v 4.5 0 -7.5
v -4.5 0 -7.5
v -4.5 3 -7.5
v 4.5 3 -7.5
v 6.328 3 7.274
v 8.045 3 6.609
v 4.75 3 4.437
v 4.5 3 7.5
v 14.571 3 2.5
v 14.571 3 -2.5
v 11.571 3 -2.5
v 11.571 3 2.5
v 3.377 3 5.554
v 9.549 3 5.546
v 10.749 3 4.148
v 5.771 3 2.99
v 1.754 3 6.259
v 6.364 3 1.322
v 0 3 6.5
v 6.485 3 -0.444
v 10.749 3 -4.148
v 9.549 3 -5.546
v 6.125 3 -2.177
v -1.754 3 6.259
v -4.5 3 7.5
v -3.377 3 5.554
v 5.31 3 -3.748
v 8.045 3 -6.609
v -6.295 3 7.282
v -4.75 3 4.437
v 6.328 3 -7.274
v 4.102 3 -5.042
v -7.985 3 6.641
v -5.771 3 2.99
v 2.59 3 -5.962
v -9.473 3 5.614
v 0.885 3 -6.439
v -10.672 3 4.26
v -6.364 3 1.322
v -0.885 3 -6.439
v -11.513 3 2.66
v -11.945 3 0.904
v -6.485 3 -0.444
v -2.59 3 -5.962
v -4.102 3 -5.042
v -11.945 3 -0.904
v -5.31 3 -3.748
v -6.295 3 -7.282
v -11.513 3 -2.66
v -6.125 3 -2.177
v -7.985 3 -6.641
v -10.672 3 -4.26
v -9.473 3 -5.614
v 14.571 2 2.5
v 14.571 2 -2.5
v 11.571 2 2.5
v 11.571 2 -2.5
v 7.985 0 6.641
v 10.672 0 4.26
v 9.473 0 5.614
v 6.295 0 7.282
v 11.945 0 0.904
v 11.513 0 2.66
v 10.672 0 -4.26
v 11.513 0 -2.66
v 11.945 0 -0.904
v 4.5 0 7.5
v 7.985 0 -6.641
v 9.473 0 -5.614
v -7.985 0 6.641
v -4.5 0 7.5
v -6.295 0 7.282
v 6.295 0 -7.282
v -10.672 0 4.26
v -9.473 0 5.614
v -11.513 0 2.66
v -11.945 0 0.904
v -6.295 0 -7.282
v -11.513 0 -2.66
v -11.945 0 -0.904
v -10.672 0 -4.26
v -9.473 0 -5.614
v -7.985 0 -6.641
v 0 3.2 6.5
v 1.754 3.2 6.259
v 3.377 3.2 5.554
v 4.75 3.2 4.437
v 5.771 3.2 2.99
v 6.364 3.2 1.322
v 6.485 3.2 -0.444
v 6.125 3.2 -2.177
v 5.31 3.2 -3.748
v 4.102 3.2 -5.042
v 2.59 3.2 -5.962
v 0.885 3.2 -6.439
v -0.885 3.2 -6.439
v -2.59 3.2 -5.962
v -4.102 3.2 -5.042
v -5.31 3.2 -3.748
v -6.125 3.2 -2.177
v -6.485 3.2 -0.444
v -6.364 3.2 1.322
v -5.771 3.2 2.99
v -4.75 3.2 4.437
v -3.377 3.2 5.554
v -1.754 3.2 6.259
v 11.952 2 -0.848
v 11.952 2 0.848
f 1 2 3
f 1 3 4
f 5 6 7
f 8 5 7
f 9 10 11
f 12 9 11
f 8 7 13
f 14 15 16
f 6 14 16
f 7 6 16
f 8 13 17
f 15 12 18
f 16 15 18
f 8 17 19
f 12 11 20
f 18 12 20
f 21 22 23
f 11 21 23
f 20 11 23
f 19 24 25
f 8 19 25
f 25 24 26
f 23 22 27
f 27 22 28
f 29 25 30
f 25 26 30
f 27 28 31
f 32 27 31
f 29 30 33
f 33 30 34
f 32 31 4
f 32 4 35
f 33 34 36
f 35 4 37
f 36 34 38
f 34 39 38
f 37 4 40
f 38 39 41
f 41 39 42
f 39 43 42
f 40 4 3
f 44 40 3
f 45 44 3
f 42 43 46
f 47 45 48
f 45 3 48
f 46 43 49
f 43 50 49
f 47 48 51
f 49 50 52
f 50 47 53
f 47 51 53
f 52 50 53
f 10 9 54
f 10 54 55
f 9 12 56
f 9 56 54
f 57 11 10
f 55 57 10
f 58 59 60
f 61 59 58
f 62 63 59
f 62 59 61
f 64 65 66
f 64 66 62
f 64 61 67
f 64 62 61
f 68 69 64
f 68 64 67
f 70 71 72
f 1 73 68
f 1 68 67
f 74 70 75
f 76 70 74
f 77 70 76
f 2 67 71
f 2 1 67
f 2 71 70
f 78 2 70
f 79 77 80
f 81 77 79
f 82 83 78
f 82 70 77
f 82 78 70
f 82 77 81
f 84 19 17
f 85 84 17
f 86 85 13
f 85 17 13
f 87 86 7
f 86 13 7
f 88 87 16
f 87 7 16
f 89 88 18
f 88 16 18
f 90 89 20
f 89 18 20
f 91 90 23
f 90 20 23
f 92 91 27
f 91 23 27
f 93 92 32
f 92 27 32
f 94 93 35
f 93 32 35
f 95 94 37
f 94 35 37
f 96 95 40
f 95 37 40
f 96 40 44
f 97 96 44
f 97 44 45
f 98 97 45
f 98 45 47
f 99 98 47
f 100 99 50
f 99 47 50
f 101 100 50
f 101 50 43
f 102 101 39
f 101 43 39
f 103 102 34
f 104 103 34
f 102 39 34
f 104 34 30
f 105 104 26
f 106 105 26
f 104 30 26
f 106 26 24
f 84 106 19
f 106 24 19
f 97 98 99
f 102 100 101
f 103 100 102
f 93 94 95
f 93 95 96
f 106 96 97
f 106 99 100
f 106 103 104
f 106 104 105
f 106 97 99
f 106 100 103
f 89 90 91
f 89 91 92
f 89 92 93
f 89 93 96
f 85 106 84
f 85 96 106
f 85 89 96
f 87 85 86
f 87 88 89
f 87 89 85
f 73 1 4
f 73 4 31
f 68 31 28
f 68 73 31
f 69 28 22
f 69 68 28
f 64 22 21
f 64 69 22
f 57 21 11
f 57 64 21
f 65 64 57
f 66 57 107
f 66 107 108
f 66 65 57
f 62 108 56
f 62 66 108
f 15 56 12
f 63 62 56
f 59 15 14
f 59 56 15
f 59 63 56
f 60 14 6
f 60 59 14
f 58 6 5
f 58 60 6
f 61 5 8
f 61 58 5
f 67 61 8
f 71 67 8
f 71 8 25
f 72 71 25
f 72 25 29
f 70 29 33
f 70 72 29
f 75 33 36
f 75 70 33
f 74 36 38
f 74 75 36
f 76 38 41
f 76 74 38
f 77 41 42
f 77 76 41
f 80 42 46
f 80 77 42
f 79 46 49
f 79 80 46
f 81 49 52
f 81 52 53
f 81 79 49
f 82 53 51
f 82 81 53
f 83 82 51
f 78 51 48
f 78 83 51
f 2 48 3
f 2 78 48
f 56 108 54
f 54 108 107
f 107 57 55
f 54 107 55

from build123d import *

# Parameters (mm, degrees)
EXTRUDE_1_DEPTH = 3
SKETCH_2_R      = 6.5
EXTRUDE_2_DEPTH = 0.2
SKETCH_4_W      = 3
SKETCH_4_H      = 5
EXTRUDE_3_DEPTH = 1


with BuildPart() as part:
    # 草图1 → 凸台-拉伸1 (new body)
    with BuildSketch(Plane(origin=(0, 0, 0), x_dir=(1, 0, 0), z_dir=(0, 1, 0))):
        with BuildLine():
            Line((-4.5, 7.5), (4.5, 7.5))
            ThreePointArc((4.5, 7.5), (12, 0), (4.5, -7.5))
            Line((4.5, -7.5), (-4.5, -7.5))
            ThreePointArc((-4.5, -7.5), (-12, 0), (-4.5, 7.5))
        make_face()
    extrude(amount=EXTRUDE_1_DEPTH)

    # 草图2 → 凸台-拉伸2 (add)
    with BuildSketch(Plane(origin=(0, 3, 0), x_dir=(1, 0, 0), z_dir=(0, 1, 0))):
        with Locations(Location((0, 0, 0), (0, 0, 270))):
            Circle(SKETCH_2_R)
    extrude(amount=EXTRUDE_2_DEPTH)

    # 草图4 → 凸台-拉伸3 (add)
    with BuildSketch(Plane(origin=(0, 3, 0), x_dir=(1, 0, 0), z_dir=(0, 1, 0))):
        with Locations((13.071067812, 0)):
            Rectangle(SKETCH_4_W, SKETCH_4_H)
    extrude(amount=-EXTRUDE_3_DEPTH)


solid = part.part
